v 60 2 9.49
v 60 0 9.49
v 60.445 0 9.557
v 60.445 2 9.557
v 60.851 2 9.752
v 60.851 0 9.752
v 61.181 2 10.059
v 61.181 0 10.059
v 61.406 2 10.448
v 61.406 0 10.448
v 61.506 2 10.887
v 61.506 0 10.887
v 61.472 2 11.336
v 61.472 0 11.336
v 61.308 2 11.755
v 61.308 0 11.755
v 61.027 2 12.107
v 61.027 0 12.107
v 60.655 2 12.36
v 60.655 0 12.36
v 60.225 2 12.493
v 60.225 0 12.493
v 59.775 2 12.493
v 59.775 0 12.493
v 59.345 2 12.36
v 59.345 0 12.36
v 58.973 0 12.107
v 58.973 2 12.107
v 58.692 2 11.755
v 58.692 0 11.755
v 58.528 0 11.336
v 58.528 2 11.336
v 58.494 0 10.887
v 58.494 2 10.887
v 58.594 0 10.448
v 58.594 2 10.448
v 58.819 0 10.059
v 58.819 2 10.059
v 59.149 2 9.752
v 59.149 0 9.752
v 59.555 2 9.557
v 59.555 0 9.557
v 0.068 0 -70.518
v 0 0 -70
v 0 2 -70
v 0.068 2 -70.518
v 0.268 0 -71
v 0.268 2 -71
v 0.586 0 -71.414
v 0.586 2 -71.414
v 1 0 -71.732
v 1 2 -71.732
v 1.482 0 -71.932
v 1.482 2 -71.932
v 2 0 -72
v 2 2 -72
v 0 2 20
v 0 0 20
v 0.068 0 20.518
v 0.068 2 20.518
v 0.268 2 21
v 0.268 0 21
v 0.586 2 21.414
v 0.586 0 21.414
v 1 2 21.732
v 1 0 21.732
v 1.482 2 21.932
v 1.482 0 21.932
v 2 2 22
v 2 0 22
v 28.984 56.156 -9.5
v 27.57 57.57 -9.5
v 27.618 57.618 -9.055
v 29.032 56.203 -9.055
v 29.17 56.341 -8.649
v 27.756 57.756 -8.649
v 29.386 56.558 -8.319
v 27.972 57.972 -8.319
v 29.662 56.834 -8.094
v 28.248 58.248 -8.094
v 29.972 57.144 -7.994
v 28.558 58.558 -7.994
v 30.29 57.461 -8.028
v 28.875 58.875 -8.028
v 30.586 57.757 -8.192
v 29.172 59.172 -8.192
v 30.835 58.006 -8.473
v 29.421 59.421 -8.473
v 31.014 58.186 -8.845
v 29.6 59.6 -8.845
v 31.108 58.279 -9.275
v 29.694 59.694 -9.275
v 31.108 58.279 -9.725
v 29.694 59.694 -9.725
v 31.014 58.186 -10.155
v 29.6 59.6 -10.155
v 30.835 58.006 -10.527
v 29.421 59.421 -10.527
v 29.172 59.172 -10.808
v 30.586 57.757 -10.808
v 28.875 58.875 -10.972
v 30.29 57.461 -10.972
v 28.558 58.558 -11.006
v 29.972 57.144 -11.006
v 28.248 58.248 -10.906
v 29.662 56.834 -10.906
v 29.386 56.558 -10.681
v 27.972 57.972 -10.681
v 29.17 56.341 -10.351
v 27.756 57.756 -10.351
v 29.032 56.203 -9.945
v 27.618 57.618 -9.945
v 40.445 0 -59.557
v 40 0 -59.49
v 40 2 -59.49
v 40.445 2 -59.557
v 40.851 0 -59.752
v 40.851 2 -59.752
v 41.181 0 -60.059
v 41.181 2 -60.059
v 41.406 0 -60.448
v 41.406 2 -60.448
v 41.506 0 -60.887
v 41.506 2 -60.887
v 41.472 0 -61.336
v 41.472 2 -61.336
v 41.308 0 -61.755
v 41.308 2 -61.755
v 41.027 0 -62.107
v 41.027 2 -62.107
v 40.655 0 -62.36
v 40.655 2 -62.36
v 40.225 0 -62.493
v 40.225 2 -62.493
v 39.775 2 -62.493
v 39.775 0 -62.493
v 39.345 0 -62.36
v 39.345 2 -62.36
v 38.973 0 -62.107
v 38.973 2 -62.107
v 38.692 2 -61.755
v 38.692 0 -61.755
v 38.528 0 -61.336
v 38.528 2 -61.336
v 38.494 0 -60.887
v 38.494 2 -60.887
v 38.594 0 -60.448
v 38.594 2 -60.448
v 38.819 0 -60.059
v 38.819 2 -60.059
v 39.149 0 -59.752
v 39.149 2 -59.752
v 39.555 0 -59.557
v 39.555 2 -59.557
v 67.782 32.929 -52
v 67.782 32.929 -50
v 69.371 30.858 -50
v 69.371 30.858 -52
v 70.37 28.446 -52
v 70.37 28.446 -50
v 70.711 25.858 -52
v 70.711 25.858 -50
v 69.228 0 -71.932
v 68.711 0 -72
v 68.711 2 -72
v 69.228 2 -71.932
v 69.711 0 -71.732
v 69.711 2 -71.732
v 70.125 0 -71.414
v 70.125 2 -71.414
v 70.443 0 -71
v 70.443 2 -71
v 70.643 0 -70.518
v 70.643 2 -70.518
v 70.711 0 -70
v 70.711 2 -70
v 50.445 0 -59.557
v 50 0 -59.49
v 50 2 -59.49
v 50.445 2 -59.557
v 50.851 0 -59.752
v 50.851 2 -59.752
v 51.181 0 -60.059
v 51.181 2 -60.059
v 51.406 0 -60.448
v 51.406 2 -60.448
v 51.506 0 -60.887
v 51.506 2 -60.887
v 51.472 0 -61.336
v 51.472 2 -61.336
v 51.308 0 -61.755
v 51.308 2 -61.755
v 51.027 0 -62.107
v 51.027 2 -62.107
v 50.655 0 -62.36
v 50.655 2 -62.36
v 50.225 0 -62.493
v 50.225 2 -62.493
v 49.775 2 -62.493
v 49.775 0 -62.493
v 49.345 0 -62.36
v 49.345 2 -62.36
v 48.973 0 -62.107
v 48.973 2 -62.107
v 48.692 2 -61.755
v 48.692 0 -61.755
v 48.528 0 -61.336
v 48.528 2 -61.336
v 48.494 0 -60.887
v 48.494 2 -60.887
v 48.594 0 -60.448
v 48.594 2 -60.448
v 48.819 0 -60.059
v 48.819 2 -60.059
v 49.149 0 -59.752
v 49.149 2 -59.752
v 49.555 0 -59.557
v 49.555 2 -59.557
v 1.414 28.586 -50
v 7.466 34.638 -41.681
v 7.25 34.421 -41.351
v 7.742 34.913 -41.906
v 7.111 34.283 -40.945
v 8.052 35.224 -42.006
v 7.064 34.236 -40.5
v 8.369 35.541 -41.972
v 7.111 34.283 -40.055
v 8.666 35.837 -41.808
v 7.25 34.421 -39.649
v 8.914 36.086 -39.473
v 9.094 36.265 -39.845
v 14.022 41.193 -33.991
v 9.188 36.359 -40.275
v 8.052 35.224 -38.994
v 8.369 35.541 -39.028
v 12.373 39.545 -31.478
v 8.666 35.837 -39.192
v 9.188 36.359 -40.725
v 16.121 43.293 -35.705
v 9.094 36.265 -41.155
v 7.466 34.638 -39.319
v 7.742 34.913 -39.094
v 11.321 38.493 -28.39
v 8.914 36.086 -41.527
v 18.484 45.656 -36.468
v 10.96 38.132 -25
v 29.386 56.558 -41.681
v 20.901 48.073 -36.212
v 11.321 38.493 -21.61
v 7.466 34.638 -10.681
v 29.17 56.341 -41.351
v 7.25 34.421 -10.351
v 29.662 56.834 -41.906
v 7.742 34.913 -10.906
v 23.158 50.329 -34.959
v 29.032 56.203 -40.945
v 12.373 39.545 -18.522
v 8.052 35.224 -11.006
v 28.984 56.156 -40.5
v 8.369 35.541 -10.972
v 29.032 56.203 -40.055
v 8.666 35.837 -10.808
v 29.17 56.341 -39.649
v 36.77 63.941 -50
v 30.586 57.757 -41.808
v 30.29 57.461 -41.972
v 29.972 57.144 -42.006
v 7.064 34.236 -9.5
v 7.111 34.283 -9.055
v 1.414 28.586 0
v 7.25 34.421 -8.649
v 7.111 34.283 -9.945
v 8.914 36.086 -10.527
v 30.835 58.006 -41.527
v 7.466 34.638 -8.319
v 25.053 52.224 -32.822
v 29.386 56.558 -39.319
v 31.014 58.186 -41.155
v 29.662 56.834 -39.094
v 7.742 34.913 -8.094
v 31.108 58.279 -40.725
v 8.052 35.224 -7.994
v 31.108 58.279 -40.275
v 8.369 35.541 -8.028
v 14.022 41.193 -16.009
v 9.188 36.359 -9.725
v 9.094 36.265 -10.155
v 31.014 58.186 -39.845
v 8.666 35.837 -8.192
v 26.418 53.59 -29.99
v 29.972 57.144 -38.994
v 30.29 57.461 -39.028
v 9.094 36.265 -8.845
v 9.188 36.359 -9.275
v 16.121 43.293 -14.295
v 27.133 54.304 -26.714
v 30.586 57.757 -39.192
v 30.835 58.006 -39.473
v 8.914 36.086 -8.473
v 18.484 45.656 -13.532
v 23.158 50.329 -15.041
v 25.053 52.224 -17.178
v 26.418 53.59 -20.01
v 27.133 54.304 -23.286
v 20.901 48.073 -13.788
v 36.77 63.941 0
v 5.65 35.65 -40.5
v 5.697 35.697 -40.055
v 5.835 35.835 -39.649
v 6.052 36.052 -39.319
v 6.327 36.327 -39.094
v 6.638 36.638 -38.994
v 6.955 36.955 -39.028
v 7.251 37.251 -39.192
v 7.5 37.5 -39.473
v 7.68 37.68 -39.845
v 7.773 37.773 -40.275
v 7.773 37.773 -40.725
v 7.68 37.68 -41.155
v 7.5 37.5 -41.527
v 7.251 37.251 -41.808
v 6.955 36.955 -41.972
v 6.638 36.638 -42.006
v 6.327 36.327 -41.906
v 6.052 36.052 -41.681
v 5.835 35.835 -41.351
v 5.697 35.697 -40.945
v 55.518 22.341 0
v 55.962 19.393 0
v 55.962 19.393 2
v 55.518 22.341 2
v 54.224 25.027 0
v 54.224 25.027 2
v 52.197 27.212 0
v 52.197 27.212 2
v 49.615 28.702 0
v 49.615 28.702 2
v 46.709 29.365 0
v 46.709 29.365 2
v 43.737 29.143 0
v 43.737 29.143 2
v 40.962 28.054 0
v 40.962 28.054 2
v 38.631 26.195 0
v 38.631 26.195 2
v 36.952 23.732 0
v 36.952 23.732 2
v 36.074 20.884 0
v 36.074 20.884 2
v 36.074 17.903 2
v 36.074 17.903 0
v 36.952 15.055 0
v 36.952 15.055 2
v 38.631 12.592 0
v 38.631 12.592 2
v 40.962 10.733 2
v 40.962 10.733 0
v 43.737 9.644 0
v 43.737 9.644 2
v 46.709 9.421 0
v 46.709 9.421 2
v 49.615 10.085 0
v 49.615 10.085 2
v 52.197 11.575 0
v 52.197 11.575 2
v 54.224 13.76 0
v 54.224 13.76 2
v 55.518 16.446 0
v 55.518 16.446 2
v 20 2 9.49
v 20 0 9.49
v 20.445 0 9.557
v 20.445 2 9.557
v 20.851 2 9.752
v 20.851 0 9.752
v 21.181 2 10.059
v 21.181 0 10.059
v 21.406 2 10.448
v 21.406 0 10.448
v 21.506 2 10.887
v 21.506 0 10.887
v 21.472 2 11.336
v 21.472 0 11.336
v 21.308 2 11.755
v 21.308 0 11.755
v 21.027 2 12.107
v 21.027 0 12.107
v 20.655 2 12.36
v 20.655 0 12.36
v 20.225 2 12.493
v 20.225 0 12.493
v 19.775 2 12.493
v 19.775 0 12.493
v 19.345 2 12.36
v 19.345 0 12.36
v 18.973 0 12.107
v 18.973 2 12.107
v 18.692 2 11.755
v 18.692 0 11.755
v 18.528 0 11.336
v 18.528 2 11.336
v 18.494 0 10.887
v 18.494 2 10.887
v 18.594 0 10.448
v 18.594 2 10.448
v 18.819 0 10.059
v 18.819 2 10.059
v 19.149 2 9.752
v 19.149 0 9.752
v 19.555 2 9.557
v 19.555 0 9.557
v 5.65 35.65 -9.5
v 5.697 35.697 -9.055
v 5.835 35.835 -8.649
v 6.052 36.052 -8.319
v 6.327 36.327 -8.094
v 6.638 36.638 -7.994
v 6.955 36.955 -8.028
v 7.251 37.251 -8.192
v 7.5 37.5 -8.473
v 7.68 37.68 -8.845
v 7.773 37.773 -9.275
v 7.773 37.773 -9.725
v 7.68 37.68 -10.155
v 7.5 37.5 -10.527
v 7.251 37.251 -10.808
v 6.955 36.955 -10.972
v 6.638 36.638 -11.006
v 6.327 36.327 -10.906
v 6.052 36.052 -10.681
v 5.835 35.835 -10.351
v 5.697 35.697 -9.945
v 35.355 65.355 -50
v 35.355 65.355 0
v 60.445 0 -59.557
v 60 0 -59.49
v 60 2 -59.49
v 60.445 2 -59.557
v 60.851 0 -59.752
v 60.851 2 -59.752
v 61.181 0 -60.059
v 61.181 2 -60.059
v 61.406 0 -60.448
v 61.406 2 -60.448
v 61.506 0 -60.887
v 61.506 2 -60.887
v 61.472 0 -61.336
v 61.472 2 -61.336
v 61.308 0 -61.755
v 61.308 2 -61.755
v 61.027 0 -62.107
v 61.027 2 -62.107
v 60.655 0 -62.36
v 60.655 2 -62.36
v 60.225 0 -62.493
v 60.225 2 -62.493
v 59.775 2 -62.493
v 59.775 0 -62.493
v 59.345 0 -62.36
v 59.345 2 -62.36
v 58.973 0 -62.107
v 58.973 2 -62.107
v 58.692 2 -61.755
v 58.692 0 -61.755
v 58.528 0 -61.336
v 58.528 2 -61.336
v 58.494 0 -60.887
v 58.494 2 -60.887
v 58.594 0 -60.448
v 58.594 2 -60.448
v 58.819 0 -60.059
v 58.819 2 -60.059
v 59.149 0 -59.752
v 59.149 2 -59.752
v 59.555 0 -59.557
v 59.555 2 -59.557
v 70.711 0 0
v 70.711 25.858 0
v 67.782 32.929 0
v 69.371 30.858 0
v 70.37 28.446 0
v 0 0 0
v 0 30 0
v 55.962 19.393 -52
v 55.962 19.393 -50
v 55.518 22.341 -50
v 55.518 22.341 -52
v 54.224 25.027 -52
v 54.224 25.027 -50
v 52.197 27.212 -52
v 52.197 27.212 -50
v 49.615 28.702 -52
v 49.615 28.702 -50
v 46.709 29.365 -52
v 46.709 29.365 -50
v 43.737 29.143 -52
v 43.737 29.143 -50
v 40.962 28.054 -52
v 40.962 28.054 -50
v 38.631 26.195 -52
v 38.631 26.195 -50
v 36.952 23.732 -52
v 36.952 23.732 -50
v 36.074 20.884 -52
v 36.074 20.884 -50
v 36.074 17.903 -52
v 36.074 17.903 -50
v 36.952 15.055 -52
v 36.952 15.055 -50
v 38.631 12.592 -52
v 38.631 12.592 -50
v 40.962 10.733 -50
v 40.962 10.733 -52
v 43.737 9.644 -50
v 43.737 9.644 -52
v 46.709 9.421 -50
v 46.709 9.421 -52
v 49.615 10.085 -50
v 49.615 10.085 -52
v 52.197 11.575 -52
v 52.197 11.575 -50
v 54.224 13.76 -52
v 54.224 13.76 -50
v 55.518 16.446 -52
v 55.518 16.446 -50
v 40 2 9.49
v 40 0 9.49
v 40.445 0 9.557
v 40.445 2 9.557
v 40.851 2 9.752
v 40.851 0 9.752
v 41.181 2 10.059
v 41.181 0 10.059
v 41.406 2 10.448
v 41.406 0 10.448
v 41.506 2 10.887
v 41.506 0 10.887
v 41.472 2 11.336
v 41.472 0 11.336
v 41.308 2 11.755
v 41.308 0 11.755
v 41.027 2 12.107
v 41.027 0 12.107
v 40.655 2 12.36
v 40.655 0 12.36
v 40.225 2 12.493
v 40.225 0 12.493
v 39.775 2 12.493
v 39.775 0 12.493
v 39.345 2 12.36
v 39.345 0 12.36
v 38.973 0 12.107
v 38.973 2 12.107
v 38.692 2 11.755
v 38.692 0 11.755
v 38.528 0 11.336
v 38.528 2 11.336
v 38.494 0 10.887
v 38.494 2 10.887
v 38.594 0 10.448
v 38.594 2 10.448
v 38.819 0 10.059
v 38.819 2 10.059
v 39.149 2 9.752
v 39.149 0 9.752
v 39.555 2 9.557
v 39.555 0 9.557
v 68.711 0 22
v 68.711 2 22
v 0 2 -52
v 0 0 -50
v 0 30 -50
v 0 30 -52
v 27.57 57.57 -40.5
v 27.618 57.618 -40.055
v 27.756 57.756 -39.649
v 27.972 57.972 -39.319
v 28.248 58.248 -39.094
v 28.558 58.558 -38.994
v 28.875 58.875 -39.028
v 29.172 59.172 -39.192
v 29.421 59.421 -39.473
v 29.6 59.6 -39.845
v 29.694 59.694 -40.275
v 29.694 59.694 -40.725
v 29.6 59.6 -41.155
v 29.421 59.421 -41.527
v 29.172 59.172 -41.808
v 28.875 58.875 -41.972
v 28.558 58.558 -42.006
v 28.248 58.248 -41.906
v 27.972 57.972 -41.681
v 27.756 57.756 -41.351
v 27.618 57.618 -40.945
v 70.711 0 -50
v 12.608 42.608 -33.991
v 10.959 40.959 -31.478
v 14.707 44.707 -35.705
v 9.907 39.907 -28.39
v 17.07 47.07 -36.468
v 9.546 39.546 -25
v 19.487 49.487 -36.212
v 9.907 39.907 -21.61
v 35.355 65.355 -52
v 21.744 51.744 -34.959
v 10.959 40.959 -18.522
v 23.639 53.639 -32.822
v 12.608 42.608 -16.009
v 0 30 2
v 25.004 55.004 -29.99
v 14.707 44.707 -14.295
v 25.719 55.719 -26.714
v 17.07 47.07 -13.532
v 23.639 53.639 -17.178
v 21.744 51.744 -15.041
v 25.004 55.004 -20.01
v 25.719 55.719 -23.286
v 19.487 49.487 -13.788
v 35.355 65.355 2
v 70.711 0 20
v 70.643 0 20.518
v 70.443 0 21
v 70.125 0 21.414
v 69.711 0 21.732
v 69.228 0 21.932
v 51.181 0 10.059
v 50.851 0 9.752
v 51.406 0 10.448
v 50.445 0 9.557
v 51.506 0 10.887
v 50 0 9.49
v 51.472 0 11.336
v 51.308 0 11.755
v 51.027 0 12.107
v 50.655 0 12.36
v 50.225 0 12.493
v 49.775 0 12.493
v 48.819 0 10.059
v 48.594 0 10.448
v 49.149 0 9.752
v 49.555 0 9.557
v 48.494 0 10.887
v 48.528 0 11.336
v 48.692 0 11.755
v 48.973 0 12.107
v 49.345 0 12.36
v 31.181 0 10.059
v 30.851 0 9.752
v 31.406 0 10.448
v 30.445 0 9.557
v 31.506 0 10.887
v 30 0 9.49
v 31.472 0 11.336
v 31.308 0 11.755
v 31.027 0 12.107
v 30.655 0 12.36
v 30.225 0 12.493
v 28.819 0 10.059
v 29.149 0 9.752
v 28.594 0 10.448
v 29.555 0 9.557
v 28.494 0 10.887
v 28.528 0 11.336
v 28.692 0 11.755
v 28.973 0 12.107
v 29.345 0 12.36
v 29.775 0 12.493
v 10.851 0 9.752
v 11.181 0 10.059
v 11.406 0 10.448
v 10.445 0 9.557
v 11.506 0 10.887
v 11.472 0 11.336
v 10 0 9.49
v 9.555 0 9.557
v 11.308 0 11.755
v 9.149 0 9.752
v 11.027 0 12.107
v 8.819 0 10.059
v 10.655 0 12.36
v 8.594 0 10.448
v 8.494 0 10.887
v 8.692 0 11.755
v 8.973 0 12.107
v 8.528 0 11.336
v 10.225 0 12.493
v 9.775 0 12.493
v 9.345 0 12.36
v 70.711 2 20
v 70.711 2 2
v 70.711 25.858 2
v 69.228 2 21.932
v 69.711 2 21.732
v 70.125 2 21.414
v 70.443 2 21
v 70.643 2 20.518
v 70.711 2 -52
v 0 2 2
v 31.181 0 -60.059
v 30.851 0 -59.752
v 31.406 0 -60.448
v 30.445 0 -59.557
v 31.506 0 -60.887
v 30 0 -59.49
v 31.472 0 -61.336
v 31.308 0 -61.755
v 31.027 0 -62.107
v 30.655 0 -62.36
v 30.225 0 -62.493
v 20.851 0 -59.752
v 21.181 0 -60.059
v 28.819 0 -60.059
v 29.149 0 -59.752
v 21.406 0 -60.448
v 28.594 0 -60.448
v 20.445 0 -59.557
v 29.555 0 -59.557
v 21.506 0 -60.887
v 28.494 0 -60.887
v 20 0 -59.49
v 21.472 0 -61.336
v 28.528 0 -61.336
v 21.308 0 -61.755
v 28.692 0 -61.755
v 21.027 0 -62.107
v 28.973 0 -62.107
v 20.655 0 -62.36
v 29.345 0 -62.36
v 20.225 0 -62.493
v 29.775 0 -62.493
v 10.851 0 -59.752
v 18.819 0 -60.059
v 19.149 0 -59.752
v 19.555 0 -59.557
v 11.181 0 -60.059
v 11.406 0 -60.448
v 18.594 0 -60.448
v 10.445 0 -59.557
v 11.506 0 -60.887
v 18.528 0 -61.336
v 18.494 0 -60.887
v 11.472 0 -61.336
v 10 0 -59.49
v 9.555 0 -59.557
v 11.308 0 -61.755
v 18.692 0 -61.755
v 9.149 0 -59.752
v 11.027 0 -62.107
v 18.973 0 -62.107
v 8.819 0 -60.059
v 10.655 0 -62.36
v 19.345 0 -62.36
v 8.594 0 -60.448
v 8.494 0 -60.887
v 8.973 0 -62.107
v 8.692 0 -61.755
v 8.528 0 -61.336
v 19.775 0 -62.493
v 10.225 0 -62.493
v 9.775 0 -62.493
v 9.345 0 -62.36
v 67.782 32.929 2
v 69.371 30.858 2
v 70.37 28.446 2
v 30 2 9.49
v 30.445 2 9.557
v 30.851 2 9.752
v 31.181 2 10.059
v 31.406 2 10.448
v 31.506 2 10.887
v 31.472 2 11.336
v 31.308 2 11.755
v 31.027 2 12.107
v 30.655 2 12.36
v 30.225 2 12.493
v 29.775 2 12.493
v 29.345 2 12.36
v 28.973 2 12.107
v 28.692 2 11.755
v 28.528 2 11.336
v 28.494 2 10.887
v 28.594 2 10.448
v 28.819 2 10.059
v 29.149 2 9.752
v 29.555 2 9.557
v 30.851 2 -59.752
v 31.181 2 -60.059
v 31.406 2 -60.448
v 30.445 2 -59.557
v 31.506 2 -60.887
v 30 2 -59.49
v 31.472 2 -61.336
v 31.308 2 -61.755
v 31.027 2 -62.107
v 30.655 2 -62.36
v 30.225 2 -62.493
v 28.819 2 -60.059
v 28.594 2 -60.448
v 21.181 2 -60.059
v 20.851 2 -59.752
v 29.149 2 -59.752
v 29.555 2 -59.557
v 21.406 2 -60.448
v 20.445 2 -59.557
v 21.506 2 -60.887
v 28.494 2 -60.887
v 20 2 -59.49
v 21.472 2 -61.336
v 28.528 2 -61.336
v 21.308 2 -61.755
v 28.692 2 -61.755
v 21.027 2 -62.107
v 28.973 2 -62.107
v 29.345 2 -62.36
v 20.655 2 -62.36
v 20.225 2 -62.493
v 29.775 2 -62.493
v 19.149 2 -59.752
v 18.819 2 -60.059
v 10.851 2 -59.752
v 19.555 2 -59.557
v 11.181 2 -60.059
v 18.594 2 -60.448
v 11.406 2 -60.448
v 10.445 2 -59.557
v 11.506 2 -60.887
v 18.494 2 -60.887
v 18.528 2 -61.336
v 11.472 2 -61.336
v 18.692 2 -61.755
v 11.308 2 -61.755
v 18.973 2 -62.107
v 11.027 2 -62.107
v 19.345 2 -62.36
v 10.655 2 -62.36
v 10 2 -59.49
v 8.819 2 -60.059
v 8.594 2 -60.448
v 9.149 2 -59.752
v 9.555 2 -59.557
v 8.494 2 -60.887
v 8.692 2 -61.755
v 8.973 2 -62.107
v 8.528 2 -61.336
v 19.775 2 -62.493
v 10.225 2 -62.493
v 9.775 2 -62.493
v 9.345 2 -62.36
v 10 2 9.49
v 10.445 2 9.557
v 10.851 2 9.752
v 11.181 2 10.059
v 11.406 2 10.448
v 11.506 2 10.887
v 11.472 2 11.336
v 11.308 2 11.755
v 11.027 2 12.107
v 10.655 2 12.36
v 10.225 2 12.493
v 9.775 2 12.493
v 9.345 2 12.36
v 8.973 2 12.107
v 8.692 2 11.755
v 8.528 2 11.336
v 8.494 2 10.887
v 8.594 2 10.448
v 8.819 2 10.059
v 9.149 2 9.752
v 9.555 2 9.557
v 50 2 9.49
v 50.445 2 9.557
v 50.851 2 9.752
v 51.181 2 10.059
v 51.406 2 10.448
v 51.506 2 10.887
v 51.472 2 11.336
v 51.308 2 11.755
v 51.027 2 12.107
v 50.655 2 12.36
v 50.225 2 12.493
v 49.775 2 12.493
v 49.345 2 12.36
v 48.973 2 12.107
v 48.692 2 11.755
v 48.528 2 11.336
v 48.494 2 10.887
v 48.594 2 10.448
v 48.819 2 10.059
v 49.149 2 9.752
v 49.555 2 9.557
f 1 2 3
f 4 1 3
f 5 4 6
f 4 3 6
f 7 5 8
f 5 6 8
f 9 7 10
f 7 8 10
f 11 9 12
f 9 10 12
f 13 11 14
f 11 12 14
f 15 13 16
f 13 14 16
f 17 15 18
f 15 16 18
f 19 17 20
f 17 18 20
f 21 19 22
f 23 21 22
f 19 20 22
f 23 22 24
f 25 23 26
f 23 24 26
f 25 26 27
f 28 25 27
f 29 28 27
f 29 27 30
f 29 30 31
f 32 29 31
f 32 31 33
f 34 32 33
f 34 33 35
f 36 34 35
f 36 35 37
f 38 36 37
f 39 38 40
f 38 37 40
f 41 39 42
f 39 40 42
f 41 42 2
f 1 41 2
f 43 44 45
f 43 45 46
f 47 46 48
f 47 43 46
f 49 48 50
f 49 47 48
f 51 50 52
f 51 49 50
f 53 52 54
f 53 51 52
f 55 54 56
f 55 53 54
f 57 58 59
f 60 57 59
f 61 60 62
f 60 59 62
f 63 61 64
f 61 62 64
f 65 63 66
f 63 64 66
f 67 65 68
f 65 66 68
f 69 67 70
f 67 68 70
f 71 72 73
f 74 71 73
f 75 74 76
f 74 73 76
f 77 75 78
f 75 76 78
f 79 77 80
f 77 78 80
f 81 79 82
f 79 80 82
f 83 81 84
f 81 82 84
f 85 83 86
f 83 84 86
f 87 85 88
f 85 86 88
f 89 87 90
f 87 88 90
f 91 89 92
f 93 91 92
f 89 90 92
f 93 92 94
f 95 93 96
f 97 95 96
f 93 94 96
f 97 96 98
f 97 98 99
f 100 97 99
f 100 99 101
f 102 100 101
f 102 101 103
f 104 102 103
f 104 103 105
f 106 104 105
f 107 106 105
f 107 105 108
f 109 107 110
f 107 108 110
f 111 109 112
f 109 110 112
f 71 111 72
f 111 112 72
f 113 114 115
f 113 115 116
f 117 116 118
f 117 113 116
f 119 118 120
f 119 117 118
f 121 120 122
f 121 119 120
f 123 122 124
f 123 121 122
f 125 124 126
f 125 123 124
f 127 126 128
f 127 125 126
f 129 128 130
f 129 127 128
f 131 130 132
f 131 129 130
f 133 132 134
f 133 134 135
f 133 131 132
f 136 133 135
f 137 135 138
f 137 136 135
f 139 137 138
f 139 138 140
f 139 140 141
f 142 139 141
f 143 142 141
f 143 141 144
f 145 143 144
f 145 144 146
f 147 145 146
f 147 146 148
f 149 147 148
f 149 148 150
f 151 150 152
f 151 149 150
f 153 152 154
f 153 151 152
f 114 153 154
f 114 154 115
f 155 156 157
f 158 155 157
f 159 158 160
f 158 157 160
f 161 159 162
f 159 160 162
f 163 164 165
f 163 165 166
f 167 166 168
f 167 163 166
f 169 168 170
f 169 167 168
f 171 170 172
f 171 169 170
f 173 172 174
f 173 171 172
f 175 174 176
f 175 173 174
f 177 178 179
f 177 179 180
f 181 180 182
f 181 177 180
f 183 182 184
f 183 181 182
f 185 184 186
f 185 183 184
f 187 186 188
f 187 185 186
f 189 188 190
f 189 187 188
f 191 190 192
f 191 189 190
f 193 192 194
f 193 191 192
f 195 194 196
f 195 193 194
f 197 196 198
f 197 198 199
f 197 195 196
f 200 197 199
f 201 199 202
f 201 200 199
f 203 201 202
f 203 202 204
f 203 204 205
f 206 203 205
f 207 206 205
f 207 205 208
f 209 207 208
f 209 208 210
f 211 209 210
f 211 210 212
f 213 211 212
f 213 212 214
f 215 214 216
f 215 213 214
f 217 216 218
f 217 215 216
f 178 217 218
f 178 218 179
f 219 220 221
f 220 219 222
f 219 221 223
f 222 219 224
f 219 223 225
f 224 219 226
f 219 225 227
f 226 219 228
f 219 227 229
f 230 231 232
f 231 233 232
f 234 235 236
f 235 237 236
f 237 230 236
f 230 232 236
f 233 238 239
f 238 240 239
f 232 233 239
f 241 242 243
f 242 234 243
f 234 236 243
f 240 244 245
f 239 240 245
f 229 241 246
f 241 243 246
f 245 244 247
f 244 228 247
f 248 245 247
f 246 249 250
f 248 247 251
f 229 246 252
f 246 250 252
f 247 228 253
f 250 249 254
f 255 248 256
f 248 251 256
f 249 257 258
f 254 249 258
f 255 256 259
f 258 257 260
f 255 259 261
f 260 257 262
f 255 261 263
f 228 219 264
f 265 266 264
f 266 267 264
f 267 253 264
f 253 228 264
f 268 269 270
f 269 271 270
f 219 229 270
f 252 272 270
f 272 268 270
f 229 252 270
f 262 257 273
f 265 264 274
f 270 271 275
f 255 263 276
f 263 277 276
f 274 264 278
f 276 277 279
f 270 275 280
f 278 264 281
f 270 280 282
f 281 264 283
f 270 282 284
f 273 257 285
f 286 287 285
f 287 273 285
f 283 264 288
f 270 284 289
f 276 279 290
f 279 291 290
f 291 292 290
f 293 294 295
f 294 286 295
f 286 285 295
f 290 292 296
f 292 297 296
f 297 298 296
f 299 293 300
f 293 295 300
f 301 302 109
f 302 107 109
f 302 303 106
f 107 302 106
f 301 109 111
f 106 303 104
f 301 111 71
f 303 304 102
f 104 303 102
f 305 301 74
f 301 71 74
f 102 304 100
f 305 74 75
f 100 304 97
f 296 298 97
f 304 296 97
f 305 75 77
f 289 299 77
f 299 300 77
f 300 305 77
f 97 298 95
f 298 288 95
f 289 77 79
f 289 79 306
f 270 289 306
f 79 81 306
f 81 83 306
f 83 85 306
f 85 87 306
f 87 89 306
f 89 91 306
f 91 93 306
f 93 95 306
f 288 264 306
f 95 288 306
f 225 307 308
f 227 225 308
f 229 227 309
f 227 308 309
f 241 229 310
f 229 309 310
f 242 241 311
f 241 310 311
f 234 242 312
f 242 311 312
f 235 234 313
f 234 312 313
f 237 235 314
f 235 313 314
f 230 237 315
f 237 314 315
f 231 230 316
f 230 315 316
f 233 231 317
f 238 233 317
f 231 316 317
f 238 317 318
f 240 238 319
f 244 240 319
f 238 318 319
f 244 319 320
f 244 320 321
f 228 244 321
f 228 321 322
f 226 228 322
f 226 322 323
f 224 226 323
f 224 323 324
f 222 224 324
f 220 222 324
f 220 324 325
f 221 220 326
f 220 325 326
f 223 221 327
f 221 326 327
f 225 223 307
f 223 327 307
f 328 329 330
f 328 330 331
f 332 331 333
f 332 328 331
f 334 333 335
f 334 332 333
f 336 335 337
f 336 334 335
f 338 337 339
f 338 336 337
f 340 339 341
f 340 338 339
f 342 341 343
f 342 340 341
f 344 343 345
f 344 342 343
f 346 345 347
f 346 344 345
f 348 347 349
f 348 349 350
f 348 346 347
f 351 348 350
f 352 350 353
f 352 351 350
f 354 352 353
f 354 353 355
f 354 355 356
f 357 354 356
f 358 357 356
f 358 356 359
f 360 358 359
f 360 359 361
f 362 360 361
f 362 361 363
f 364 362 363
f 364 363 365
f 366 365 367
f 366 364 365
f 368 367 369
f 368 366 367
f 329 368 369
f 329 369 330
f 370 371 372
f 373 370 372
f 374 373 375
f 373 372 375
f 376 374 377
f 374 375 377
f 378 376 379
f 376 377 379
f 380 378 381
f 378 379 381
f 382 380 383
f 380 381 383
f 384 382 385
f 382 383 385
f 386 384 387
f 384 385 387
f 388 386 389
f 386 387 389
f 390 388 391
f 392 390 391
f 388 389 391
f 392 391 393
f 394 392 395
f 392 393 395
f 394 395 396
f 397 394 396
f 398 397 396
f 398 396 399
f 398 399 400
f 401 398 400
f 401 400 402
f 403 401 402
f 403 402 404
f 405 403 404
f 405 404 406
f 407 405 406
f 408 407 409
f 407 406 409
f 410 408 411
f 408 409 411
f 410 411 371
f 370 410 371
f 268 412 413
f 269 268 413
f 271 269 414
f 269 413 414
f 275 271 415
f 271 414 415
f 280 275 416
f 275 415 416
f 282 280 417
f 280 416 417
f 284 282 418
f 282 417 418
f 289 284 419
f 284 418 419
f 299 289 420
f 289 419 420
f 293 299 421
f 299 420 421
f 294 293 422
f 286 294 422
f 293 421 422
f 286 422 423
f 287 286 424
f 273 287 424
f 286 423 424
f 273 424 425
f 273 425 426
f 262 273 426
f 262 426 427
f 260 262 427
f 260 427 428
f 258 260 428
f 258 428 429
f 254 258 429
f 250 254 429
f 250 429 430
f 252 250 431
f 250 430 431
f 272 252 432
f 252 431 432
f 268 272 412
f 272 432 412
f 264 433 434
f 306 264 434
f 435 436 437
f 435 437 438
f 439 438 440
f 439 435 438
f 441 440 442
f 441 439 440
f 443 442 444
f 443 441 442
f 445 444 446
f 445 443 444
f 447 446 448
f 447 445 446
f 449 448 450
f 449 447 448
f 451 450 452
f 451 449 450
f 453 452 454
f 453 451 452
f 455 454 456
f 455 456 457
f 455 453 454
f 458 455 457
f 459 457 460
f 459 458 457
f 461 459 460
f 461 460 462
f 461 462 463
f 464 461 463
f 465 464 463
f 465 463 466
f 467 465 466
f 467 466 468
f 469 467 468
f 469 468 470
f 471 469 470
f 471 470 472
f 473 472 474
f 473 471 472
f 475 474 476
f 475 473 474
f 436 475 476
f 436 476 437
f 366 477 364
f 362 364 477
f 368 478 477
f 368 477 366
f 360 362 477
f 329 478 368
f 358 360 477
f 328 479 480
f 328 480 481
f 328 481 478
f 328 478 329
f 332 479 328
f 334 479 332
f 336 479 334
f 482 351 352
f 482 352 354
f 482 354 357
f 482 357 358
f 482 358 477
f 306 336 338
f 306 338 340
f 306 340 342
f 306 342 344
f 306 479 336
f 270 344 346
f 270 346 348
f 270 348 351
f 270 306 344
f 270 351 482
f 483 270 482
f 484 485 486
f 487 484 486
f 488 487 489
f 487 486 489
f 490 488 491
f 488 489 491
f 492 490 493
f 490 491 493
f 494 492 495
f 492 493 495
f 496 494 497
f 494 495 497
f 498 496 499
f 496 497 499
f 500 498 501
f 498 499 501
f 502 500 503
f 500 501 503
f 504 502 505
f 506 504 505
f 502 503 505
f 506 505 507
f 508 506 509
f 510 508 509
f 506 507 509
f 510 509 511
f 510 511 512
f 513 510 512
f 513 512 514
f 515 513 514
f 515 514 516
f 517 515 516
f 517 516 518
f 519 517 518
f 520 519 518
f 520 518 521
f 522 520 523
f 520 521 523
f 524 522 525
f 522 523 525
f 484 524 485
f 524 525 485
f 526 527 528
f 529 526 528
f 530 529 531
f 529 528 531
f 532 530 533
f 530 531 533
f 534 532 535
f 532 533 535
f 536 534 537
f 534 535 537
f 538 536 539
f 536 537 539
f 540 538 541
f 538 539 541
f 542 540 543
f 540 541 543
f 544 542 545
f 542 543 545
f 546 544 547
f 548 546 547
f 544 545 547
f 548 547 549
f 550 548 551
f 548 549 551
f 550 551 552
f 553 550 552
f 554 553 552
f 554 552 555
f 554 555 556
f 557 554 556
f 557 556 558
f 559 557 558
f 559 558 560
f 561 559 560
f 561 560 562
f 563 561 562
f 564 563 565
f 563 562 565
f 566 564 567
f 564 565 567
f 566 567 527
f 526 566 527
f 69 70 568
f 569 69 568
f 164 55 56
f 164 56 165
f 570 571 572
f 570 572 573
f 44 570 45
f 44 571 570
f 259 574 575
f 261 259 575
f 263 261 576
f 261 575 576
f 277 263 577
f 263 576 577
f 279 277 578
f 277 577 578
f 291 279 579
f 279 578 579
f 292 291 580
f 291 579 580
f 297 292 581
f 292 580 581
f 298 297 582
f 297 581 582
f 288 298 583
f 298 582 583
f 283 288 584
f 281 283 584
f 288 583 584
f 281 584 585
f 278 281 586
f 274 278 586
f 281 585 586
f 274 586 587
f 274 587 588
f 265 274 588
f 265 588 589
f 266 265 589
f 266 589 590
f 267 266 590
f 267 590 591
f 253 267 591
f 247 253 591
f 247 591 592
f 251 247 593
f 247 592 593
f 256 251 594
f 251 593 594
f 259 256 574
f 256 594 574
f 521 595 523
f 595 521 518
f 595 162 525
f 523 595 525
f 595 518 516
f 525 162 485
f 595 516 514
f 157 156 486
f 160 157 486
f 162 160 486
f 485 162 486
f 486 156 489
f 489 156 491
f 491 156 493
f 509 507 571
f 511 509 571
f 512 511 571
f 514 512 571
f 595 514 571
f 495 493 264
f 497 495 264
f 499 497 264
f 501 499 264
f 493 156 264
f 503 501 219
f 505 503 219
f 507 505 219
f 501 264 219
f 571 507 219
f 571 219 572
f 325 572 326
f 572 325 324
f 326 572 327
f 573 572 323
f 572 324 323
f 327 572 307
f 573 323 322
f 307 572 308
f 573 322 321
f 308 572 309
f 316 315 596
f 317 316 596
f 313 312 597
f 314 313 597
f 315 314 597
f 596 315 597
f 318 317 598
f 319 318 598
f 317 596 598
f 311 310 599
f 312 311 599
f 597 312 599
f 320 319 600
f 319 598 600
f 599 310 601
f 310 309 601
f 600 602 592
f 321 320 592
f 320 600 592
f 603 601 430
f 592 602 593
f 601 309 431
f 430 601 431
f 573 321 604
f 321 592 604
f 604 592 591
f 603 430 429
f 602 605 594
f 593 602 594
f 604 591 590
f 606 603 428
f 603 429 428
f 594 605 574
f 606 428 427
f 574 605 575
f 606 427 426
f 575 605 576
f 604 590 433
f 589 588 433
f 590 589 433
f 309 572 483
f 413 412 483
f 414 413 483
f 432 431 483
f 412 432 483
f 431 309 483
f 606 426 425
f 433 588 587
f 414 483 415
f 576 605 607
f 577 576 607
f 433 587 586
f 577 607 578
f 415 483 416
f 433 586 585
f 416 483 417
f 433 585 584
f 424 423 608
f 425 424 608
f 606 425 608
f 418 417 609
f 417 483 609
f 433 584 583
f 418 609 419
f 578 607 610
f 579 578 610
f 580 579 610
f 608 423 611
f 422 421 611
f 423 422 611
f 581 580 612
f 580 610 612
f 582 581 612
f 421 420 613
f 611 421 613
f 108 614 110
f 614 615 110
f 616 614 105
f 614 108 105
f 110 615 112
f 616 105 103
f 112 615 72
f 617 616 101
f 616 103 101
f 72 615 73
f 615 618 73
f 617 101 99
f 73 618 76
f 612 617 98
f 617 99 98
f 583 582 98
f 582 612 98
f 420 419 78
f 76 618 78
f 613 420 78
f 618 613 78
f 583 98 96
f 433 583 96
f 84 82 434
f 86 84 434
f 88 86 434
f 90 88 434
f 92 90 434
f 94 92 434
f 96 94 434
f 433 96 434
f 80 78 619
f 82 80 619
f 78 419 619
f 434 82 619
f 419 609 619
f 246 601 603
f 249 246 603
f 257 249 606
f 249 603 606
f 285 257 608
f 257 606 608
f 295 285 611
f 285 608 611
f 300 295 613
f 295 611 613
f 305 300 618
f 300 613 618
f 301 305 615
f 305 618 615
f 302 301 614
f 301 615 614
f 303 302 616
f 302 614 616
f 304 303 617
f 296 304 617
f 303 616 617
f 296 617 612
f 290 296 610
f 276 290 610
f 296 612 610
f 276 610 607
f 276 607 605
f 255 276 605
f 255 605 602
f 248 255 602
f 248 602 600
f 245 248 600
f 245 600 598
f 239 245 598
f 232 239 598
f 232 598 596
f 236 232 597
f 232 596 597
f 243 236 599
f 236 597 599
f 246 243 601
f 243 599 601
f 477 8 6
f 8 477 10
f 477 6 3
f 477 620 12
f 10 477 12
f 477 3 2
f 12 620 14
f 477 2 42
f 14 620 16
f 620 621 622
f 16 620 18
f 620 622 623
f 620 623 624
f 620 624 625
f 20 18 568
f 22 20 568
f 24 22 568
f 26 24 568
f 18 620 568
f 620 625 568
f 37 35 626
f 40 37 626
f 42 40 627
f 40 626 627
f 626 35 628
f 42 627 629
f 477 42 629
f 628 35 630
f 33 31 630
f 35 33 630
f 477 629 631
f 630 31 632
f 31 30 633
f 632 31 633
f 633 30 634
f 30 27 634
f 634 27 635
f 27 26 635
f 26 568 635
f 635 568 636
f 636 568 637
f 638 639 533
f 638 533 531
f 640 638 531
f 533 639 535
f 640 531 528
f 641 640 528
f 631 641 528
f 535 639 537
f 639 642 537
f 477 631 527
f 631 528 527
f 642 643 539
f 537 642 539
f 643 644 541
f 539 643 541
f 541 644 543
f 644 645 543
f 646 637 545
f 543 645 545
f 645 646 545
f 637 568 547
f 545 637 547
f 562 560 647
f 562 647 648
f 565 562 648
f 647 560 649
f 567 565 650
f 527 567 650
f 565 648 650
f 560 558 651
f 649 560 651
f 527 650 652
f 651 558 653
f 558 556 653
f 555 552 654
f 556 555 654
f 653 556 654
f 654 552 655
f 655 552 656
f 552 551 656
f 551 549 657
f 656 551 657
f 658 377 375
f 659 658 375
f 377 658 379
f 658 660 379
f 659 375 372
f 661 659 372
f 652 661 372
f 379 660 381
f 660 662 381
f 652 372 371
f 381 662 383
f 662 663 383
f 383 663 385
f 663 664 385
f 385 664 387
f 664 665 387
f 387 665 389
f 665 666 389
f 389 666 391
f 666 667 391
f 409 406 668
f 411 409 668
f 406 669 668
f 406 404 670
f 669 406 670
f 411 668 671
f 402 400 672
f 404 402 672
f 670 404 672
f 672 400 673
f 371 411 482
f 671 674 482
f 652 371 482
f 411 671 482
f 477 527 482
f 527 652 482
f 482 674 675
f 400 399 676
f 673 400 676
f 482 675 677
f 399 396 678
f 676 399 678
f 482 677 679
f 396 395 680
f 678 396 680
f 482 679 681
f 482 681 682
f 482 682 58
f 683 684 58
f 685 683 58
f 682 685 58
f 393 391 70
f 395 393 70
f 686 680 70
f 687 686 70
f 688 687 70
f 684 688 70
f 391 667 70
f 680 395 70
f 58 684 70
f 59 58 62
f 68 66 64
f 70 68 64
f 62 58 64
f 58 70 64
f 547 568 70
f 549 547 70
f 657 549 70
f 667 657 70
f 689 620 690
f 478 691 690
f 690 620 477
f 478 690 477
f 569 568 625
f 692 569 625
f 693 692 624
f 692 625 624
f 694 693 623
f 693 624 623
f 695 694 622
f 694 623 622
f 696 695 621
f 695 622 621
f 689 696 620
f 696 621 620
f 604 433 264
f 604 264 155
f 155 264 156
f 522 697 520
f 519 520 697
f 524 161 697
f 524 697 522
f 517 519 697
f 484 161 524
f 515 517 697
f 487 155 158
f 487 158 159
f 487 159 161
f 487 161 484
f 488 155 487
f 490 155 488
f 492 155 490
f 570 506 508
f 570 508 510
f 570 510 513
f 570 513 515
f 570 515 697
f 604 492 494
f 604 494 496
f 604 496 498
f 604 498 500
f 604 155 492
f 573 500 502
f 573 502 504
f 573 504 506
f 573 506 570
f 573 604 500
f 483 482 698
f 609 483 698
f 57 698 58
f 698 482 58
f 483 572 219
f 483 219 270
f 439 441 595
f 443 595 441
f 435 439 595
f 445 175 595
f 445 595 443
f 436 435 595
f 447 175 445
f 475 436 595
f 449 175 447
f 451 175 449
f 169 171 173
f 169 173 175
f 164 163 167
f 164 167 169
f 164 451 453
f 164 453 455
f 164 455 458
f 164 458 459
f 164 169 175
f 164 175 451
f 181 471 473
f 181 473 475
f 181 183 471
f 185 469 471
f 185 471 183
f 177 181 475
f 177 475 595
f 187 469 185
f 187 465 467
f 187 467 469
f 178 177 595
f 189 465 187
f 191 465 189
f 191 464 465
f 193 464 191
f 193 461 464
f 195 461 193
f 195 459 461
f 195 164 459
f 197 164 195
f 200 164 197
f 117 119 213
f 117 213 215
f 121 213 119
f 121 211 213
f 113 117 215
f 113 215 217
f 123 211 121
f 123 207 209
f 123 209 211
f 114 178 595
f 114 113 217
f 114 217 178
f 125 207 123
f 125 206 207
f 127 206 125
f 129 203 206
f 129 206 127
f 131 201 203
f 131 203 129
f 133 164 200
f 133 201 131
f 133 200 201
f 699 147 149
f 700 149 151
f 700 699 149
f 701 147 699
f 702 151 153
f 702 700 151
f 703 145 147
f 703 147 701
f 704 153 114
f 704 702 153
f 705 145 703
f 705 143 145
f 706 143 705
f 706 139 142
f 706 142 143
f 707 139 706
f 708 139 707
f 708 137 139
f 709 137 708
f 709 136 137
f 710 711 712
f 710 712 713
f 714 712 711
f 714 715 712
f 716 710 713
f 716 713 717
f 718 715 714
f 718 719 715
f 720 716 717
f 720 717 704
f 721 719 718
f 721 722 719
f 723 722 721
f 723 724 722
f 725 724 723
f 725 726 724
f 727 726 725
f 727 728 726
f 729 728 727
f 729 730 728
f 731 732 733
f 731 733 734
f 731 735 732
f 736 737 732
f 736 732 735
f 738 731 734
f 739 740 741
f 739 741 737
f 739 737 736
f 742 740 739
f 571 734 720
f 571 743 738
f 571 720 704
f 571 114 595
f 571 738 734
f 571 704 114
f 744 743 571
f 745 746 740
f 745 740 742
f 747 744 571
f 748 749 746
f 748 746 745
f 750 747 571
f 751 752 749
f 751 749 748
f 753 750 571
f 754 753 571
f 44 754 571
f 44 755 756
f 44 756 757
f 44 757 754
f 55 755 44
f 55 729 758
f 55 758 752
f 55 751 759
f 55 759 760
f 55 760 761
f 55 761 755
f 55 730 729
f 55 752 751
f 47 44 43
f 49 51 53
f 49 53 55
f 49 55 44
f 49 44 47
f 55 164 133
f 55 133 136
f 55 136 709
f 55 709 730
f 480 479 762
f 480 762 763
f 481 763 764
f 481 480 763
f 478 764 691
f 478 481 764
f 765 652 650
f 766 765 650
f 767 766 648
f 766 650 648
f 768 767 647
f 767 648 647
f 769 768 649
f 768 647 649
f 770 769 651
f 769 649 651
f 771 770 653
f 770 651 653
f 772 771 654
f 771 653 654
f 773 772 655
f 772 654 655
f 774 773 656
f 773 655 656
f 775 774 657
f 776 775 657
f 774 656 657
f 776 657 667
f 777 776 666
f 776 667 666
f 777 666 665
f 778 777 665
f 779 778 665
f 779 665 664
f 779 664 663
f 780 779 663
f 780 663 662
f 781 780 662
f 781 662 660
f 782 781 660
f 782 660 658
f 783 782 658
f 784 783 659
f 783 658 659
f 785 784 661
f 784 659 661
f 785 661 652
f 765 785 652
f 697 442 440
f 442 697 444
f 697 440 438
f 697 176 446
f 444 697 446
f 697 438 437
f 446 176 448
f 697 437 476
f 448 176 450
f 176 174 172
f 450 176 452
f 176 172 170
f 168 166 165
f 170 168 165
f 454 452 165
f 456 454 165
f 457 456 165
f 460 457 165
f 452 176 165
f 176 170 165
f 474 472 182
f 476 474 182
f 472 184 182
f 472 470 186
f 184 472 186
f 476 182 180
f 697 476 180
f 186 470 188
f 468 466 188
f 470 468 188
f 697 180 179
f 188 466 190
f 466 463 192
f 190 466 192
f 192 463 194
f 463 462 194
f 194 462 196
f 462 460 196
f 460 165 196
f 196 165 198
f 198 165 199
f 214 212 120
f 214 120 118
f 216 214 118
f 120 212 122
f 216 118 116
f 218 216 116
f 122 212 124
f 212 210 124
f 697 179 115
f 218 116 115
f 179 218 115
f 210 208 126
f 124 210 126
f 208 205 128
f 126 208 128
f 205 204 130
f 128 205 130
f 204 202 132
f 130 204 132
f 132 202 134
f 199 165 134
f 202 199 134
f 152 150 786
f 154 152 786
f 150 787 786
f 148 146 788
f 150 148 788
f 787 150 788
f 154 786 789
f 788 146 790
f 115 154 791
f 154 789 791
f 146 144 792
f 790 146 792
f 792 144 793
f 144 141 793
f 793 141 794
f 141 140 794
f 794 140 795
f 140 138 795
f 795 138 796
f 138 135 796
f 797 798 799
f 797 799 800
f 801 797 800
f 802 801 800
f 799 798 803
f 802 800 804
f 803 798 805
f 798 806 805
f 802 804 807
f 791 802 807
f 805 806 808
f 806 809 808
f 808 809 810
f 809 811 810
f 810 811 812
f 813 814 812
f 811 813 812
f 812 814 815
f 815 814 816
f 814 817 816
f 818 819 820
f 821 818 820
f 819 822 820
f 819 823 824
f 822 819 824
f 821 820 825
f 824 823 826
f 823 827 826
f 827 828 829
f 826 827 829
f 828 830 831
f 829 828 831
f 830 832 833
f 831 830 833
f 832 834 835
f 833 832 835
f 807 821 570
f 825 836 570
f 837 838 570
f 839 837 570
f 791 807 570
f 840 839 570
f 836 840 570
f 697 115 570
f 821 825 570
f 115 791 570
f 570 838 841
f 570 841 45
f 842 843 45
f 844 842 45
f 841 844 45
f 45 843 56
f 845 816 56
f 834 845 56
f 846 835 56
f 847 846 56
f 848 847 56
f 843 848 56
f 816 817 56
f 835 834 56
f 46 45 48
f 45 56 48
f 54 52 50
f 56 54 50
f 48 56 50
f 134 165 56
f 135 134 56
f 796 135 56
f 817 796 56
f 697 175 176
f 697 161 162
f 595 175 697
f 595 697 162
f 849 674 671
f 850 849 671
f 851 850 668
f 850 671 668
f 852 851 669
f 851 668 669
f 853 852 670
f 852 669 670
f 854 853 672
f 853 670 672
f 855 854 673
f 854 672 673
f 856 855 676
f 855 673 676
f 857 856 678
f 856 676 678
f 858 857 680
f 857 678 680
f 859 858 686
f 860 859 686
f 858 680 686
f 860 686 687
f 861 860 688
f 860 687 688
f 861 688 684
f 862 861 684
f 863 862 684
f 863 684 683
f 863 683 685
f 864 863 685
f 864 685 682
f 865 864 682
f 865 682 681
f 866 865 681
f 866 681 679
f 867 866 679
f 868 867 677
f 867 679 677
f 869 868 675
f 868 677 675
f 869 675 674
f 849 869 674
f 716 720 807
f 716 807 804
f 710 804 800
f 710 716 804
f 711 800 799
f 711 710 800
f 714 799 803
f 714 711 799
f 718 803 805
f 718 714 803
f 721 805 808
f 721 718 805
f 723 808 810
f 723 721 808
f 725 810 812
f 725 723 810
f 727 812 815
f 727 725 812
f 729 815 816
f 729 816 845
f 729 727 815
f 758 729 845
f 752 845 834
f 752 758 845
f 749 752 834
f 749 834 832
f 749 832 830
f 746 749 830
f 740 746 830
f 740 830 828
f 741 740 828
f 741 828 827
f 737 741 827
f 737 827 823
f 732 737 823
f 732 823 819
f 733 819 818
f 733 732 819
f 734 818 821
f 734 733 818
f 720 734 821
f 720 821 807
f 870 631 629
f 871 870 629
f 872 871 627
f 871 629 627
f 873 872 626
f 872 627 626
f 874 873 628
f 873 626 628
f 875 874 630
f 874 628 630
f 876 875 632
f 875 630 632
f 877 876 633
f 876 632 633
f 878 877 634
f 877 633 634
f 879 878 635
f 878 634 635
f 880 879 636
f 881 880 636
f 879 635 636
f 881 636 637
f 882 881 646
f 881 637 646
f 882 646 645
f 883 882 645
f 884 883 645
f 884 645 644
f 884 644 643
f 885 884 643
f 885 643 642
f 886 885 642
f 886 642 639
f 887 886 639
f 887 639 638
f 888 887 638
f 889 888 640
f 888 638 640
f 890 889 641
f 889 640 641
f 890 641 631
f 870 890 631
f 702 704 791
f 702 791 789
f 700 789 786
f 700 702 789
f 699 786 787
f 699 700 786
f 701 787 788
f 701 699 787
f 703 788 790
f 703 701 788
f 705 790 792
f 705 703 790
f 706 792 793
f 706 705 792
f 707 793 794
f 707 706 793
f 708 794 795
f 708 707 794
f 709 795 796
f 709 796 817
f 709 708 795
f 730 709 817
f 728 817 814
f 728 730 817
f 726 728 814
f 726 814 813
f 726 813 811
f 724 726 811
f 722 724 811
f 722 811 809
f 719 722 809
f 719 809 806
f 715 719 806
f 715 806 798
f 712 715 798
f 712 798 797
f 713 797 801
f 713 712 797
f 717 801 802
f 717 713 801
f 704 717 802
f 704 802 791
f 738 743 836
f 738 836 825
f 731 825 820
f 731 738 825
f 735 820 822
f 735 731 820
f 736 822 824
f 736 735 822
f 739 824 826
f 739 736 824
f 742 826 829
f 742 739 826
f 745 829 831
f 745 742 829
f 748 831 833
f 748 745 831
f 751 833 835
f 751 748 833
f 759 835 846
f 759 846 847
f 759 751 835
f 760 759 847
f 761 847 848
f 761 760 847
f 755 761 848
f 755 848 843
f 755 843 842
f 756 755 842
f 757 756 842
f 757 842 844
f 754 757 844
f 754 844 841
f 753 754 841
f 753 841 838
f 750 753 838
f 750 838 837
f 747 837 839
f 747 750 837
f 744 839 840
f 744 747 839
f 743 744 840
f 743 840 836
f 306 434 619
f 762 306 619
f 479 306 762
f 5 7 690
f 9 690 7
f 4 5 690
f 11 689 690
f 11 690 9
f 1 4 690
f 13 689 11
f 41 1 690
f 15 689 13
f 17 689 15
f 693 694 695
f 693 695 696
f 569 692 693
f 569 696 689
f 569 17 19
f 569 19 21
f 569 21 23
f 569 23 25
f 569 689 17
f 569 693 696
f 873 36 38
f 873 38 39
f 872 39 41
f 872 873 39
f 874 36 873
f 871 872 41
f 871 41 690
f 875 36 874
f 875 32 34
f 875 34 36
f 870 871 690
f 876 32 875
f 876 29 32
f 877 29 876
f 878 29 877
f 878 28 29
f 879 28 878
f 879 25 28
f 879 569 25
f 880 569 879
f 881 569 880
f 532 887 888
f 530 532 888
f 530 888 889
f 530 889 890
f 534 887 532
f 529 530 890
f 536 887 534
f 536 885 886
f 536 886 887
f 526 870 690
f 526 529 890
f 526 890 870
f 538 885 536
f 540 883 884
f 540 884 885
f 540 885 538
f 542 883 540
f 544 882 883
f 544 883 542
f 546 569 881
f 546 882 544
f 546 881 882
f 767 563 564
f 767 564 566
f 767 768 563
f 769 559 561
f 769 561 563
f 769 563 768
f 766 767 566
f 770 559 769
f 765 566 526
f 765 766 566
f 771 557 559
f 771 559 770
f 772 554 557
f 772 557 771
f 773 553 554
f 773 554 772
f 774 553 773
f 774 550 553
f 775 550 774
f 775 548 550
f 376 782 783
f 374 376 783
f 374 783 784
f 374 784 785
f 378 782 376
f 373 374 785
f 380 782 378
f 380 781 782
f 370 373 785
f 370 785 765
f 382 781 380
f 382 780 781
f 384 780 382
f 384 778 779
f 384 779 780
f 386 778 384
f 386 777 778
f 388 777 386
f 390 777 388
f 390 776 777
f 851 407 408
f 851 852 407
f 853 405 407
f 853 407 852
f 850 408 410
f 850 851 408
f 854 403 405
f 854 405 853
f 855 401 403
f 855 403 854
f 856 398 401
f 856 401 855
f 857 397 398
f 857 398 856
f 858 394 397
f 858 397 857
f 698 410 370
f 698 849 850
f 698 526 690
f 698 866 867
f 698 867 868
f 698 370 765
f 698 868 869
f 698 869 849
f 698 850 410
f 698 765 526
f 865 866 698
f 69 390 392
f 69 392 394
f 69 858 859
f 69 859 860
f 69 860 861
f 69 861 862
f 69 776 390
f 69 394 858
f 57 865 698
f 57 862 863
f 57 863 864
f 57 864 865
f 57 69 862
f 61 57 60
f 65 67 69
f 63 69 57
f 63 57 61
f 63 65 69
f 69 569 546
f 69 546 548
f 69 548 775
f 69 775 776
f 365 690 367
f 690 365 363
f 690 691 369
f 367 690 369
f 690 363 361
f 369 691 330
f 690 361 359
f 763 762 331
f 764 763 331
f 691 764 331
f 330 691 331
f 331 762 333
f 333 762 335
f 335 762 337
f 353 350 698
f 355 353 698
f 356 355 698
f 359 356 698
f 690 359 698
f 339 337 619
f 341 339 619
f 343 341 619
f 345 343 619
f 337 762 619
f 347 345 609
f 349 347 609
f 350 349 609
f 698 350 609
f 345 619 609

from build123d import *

# Parameters (mm, degrees)
SKETCH_1_R      = 10
EXTRUDE_1_DEPTH = 2
SKETCH_2_W      = 50
SKETCH_2_H      = 50
SKETCH_2_R      = 11.5
SKETCH_2_R_2    = 1.51
EXTRUDE_2_DEPTH = 2
SKETCH_3_R      = 1.51
EXTRUDE_3_DEPTH = 2


with BuildPart() as part:
    # 草图1 → 凸台-拉伸1 (new body)
    with BuildSketch(Plane.XY):
        with BuildLine():
            Line((0, 0), (0, 30))
            Line((0, 30), (35.355339059, 65.355339059))
            Line((35.355339059, 65.355339059), (67.781745931, 32.928932188))
            ThreePointArc((67.781745931, 32.928932188), (69.949473444, 29.6846987), (70.710678119, 25.857864376))
            Line((70.710678119, 25.857864376), (70.710678119, 0))
            Line((70.710678119, 0), (0, 0))
        make_face()
        with Locations((45.961940777, 19.393398282)):
            Circle(SKETCH_1_R, mode=Mode.SUBTRACT)
    extrude_1 = extrude(amount=EXTRUDE_1_DEPTH)

    # 草图2 → 凸台-拉伸2 (add)
    with BuildSketch(Plane(origin=(-15, 15, 0), x_dir=(0, 0, 1), z_dir=(-0.7071067811865477, 0.7071067811865475, 0))):
        with Locations((-25, 46.213203436)):
            Rectangle(SKETCH_2_W, SKETCH_2_H)
        with Locations(Location((-25, 46.213203436, 0), (0, 0, 270))):
            Circle(SKETCH_2_R, mode=Mode.SUBTRACT)
        with Locations(Location((-40.5, 61.713203436, 0), (0, 0, 270))):
            Circle(SKETCH_2_R_2, mode=Mode.SUBTRACT)
        with Locations(Location((-9.5, 61.713203436, 0), (0, 0, 270))):
            Circle(SKETCH_2_R_2, mode=Mode.SUBTRACT)
        with Locations(Location((-9.5, 30.713203436, 0), (0, 0, 270))):
            Circle(SKETCH_2_R_2, mode=Mode.SUBTRACT)
        with Locations(Location((-40.5, 30.713203436, 0), (0, 0, 270))):
            Circle(SKETCH_2_R_2, mode=Mode.SUBTRACT)
    extrude(amount=-EXTRUDE_2_DEPTH)

    # 草图3 → 凸台-拉伸3 (add)
    with BuildSketch(Plane.XZ):
        with BuildLine():
            Line((0, 2), (0, 20))
            ThreePointArc((0, 20), (0.585786438, 21.414213562), (2, 22))
            Line((2, 22), (68.710678119, 22))
            ThreePointArc((68.710678119, 22), (70.124891681, 21.414213562), (70.710678119, 20))
            Line((70.710678119, 20), (70.710678119, 2))
            Line((70.710678119, 2), (0, 2))
        make_face()
        with Locations(Location((10, 11, 0), (0, 0, 270))):
            Circle(SKETCH_3_R, mode=Mode.SUBTRACT)
        with Locations(Location((20, 11, 0), (0, 0, 270))):
            Circle(SKETCH_3_R, mode=Mode.SUBTRACT)
        with Locations(Location((30, 11, 0), (0, 0, 270))):
            Circle(SKETCH_3_R, mode=Mode.SUBTRACT)
        with Locations(Location((40, 11, 0), (0, 0, 270))):
            Circle(SKETCH_3_R, mode=Mode.SUBTRACT)
        with Locations(Location((50, 11, 0), (0, 0, 270))):
            Circle(SKETCH_3_R, mode=Mode.SUBTRACT)
        with Locations(Location((60, 11, 0), (0, 0, 270))):
            Circle(SKETCH_3_R, mode=Mode.SUBTRACT)
    extrude_3 = extrude(amount=-EXTRUDE_3_DEPTH)

    # 镜向1: 凸台-拉伸1, 凸台-拉伸3 across plane
    add(extrude_1.mirror(Plane(origin=(0, 0, -25), x_dir=(1, 0, 0), z_dir=(0, 0, -1))))
    add(extrude_3.mirror(Plane(origin=(0, 0, -25), x_dir=(1, 0, 0), z_dir=(0, 0, -1))))


solid = part.part
